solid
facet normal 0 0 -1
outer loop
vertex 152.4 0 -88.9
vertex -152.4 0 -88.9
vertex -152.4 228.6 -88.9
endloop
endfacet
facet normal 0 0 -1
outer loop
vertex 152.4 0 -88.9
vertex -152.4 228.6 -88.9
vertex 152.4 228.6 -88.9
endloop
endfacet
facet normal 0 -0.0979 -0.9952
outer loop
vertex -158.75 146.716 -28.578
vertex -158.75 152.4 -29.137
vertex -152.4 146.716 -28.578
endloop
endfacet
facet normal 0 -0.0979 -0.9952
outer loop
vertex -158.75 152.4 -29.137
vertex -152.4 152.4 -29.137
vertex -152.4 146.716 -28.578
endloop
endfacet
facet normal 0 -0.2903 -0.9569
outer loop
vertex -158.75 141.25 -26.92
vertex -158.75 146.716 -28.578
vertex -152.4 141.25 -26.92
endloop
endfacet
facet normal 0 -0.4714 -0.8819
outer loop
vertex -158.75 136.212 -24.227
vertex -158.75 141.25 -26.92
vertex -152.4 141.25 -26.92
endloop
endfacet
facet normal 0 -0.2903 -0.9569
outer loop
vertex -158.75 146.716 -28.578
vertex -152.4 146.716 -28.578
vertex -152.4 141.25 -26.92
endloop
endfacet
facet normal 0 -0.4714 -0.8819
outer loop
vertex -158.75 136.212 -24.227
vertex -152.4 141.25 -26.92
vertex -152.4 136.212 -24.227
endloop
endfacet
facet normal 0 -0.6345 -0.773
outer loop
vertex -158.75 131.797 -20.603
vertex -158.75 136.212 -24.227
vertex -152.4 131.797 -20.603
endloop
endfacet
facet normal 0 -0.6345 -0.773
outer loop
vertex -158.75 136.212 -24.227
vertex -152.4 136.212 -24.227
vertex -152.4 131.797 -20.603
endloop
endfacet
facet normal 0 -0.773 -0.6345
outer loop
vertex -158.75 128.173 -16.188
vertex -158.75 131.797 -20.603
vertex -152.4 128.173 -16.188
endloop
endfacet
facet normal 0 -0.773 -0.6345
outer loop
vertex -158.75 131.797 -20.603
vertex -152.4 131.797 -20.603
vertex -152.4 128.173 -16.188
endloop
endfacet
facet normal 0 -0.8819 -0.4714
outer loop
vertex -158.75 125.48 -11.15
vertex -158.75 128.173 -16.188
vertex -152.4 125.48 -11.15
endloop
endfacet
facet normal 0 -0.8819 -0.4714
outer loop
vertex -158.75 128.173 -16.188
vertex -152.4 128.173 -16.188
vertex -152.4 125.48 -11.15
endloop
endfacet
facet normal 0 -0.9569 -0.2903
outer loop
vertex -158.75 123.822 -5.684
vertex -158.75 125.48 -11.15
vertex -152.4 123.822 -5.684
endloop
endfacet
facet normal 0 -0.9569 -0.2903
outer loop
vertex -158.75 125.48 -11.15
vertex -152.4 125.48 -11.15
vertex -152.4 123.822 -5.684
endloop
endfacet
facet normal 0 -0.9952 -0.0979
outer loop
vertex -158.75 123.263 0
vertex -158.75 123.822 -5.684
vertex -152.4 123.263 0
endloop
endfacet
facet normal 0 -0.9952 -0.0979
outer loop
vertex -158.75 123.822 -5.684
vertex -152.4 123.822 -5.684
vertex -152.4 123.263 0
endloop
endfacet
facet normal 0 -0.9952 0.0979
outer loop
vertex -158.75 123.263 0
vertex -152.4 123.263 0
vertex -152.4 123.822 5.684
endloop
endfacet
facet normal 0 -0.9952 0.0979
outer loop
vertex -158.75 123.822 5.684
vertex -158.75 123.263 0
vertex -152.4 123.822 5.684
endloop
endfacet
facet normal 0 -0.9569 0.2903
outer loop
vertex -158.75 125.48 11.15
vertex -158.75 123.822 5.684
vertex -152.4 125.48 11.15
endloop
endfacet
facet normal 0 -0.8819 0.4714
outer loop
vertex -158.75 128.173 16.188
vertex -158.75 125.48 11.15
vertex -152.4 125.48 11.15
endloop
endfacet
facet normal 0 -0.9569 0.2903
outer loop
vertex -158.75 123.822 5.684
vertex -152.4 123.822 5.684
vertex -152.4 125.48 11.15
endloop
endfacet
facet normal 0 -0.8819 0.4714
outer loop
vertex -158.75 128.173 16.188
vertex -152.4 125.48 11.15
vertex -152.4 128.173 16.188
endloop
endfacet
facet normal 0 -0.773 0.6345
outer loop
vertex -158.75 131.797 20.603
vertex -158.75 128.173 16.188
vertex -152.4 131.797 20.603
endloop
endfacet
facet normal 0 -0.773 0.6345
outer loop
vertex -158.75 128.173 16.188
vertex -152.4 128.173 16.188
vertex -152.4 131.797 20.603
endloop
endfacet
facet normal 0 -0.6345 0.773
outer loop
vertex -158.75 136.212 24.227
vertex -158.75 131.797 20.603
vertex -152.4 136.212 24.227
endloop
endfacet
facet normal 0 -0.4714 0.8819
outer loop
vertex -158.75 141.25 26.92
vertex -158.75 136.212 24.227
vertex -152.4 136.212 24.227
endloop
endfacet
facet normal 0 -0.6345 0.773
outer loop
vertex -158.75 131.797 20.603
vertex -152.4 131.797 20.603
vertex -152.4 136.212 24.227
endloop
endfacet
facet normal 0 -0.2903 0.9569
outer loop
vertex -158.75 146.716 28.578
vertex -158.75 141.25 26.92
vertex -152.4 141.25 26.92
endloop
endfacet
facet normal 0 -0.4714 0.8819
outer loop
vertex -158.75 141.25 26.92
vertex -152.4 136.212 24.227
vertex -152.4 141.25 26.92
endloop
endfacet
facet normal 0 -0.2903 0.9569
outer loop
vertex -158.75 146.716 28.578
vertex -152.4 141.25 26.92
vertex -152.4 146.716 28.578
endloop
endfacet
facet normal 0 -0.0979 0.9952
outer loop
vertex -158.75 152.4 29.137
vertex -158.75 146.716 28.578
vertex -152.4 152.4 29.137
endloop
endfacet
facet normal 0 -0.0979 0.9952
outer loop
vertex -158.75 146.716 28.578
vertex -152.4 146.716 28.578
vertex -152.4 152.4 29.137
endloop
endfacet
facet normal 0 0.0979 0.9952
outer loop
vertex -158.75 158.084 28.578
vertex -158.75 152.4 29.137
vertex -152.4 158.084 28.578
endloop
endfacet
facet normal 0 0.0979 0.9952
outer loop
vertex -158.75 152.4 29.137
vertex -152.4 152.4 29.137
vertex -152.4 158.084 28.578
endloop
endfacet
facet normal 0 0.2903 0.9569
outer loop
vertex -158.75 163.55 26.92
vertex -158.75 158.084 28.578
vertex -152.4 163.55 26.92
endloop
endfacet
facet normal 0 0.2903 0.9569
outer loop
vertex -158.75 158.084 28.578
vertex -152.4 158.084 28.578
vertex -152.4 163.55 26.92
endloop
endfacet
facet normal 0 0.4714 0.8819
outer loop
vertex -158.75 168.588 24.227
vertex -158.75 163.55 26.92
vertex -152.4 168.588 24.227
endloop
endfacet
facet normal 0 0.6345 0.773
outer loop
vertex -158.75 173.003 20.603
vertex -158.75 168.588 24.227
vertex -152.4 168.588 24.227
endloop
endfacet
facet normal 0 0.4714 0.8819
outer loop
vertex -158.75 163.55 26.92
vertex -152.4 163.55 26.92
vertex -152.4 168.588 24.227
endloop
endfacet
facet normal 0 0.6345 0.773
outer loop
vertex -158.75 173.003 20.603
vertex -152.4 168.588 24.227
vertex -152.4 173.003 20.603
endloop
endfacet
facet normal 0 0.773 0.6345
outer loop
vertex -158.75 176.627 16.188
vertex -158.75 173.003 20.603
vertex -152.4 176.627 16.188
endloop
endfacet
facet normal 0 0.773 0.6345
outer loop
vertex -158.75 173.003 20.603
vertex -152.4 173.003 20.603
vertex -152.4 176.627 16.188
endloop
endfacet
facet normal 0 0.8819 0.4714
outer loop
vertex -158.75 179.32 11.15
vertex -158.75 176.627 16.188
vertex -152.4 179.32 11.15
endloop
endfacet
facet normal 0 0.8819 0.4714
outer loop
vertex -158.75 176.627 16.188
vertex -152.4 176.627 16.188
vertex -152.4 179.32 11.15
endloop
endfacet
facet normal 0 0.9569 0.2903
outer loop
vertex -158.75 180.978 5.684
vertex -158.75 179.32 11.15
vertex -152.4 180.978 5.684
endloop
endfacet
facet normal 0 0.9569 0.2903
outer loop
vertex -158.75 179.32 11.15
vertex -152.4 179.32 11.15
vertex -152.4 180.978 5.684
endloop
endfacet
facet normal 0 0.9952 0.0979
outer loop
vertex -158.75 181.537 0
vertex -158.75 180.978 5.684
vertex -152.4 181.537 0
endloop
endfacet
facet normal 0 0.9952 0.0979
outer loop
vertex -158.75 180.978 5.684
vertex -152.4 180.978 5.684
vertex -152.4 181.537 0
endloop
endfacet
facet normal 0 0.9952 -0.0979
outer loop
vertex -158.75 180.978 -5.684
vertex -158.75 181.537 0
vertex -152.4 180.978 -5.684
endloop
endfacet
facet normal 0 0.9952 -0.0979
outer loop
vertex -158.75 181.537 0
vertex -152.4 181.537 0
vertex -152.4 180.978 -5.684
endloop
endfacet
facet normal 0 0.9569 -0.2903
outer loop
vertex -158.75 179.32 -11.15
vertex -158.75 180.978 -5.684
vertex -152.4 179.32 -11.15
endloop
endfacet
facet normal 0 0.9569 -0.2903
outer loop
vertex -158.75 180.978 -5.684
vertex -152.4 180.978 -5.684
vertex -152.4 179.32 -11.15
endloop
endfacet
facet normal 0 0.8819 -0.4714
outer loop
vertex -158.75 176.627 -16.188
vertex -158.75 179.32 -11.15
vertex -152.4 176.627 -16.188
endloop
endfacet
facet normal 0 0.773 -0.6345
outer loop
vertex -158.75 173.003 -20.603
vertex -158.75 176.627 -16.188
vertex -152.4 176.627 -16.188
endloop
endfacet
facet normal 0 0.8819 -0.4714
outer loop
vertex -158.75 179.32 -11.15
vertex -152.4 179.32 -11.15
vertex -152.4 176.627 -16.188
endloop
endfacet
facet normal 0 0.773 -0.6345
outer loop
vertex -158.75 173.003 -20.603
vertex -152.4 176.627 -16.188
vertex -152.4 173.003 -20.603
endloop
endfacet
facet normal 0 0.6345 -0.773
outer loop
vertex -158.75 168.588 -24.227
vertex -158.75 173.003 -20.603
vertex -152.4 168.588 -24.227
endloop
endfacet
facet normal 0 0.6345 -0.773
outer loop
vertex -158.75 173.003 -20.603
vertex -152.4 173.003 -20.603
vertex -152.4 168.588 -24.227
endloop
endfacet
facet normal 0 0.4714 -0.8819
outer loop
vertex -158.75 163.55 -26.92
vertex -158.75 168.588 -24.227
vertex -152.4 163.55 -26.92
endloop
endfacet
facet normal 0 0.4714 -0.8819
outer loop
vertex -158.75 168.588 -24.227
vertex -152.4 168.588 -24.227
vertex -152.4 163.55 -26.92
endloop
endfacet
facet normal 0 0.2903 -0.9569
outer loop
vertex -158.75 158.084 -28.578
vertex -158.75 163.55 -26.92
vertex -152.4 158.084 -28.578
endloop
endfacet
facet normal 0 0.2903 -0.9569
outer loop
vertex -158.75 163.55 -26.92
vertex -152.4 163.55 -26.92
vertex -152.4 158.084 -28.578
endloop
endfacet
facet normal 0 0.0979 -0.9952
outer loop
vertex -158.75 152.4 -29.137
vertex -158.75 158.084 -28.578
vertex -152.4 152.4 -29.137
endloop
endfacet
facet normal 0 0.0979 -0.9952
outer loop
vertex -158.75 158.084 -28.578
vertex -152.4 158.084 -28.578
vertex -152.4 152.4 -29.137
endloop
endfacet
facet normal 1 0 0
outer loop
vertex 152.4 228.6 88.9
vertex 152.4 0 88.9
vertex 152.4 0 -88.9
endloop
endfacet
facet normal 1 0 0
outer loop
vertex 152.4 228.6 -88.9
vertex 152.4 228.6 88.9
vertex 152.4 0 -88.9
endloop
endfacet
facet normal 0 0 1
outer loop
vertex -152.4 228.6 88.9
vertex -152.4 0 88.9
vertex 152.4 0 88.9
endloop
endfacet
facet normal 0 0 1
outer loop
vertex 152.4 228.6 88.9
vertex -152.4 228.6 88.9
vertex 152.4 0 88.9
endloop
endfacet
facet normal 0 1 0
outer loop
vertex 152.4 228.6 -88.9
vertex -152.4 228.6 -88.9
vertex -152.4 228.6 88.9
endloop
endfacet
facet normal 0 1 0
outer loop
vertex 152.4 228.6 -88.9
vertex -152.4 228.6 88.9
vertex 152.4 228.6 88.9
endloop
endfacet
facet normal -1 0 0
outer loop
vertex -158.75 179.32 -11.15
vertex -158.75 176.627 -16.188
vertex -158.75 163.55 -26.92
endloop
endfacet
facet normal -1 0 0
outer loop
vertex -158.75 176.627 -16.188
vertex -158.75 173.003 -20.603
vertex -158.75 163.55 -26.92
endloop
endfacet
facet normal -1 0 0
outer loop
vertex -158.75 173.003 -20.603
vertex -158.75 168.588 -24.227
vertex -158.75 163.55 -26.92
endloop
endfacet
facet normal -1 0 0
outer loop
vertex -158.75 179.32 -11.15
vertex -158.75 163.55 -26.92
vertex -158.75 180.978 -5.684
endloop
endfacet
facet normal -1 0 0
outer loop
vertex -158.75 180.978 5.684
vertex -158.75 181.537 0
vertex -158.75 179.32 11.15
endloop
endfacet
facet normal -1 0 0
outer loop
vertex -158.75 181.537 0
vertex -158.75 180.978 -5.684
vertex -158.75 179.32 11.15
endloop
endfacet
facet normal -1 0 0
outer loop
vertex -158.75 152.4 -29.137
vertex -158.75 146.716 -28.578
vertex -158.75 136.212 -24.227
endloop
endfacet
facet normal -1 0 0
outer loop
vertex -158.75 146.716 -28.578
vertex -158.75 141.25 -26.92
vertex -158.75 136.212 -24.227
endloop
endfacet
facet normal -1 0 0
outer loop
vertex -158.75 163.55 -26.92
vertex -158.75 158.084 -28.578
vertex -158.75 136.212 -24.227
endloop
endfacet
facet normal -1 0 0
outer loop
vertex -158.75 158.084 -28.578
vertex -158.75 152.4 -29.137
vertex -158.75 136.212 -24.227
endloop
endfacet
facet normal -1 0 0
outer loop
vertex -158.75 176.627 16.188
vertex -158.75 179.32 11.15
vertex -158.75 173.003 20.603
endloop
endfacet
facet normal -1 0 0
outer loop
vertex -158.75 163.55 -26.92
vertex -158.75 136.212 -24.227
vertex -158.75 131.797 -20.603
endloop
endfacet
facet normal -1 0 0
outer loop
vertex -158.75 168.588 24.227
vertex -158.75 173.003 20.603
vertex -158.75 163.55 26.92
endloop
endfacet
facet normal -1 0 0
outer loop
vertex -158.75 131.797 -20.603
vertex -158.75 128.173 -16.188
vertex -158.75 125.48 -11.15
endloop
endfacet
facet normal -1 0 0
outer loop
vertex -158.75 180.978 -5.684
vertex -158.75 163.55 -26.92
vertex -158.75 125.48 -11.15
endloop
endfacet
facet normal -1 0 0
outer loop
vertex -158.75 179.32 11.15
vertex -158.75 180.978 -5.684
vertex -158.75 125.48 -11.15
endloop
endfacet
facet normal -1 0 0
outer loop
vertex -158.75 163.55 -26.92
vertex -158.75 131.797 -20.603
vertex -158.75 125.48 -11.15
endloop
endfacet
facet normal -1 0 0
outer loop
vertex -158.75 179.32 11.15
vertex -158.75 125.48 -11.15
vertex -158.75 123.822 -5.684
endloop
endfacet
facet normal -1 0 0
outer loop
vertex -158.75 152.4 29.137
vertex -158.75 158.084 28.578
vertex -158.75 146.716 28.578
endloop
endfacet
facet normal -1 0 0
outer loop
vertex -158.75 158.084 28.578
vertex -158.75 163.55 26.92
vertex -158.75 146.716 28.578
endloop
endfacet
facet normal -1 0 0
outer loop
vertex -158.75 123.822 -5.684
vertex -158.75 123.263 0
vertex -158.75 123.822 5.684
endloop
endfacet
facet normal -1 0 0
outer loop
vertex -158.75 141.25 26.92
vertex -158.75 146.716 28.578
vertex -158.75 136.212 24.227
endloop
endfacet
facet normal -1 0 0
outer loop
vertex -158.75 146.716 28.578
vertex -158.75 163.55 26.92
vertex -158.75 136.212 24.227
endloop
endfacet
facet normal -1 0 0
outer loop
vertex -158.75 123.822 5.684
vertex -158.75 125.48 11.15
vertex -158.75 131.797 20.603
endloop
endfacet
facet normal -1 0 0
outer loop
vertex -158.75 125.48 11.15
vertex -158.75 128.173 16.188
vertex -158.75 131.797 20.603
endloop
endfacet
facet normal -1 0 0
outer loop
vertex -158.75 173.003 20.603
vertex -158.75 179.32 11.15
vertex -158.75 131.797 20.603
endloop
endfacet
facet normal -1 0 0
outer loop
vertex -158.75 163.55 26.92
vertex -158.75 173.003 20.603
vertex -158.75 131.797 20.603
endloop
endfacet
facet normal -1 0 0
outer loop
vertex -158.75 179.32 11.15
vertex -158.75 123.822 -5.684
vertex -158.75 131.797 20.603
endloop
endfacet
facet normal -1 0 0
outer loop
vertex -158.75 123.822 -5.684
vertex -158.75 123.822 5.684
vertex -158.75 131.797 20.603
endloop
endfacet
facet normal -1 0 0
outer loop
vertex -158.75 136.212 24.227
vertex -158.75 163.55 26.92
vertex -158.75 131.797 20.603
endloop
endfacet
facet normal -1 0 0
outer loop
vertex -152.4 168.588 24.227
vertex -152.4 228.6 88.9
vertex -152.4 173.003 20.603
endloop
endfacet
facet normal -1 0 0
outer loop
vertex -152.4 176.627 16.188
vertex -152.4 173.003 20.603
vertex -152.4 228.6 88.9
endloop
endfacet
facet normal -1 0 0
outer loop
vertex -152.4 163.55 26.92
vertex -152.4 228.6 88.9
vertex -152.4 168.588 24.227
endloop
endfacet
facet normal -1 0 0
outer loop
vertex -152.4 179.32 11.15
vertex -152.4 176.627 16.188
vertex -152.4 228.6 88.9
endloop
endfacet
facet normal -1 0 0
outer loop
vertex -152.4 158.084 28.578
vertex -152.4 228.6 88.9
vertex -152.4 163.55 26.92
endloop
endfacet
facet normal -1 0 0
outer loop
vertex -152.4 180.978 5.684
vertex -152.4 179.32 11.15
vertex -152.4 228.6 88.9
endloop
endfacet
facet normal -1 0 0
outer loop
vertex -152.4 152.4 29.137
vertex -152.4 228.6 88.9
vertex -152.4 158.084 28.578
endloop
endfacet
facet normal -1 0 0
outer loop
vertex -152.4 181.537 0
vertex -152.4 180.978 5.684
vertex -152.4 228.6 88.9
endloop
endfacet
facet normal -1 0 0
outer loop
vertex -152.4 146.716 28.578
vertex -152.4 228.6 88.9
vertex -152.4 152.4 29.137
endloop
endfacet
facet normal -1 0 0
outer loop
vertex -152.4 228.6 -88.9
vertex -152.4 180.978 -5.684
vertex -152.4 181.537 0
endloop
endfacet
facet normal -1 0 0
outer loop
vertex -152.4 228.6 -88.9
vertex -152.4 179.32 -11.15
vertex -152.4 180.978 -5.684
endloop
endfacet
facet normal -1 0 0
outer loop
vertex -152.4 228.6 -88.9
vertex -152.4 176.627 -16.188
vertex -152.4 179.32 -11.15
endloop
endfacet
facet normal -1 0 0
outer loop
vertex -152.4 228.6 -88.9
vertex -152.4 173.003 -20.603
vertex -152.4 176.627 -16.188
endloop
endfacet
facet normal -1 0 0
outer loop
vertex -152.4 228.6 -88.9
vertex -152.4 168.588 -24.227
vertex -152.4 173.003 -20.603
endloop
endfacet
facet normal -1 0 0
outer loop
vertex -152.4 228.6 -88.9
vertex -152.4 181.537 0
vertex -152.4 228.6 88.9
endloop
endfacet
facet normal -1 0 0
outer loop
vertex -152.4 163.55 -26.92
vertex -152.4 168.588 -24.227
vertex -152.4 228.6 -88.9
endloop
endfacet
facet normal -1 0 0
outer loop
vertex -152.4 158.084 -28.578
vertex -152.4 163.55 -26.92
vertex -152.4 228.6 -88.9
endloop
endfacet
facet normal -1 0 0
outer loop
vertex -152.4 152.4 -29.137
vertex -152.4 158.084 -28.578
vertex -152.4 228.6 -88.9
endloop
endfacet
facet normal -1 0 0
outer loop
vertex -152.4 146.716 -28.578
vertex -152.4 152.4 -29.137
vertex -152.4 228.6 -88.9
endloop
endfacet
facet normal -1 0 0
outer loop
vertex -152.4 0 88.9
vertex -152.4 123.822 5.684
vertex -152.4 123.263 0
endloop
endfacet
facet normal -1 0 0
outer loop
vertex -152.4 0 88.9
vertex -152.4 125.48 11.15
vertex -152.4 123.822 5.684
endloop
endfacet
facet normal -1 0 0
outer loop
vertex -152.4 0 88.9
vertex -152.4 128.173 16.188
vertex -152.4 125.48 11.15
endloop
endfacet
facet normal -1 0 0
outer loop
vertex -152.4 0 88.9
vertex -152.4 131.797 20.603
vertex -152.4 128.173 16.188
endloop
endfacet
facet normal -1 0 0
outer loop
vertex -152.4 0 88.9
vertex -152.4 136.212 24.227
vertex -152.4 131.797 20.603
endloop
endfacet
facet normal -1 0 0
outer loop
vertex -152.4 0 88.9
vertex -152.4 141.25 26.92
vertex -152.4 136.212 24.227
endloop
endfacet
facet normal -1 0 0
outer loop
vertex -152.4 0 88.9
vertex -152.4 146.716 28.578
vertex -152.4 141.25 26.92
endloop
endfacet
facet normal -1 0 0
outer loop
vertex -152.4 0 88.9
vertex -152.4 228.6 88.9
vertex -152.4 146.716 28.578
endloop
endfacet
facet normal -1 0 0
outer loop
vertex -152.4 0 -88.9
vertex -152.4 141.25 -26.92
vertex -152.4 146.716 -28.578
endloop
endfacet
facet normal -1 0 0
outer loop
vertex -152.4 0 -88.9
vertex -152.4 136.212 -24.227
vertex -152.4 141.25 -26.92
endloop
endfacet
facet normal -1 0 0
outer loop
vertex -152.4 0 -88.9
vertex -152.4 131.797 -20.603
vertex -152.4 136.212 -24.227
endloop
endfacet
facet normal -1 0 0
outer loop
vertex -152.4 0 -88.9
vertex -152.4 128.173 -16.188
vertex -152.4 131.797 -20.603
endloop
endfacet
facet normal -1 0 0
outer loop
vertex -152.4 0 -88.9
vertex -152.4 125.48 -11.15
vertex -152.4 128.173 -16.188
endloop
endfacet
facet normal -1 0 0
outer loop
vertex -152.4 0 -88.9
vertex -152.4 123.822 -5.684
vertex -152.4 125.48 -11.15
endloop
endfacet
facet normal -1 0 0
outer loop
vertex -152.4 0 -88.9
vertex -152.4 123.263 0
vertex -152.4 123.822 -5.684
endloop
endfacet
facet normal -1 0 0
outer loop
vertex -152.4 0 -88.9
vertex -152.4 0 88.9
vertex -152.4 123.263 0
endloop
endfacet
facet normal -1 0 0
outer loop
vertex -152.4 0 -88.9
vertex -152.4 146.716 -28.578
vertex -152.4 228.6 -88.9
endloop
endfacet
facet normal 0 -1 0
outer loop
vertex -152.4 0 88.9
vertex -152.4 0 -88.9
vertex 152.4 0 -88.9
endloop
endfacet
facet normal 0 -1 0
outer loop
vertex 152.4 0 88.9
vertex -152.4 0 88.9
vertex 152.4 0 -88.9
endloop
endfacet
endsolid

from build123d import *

# Parameters (mm, degrees)
SKETCH1_W           = 304.8
SKETCH1_H           = 177.8
BOSS_EXTRUDE1_DEPTH = 228.6
SKETCH2_W           = 6.35
SKETCH2_H           = 29.137469297


with BuildPart() as part:
    # Sketch1 → Boss-Extrude1 (new body)
    with BuildSketch(Plane(origin=(0, 0, 0), x_dir=(1, 0, 0), z_dir=(0, 1, 0))):
        Rectangle(SKETCH1_W, SKETCH1_H)
    extrude(amount=BOSS_EXTRUDE1_DEPTH)

    # Sketch2 → Revolve1 (revolve)
    with BuildSketch(Plane(origin=(0, 152.4, 0), x_dir=(1, 0, 0), z_dir=(0, 1, 0))):
        with Locations((-155.575, 14.568734649)):
            Rectangle(SKETCH2_W, SKETCH2_H)
    revolve(axis=Axis((-152.4, 152.4, 0), (-1, 0, 0)))


solid = part.part
